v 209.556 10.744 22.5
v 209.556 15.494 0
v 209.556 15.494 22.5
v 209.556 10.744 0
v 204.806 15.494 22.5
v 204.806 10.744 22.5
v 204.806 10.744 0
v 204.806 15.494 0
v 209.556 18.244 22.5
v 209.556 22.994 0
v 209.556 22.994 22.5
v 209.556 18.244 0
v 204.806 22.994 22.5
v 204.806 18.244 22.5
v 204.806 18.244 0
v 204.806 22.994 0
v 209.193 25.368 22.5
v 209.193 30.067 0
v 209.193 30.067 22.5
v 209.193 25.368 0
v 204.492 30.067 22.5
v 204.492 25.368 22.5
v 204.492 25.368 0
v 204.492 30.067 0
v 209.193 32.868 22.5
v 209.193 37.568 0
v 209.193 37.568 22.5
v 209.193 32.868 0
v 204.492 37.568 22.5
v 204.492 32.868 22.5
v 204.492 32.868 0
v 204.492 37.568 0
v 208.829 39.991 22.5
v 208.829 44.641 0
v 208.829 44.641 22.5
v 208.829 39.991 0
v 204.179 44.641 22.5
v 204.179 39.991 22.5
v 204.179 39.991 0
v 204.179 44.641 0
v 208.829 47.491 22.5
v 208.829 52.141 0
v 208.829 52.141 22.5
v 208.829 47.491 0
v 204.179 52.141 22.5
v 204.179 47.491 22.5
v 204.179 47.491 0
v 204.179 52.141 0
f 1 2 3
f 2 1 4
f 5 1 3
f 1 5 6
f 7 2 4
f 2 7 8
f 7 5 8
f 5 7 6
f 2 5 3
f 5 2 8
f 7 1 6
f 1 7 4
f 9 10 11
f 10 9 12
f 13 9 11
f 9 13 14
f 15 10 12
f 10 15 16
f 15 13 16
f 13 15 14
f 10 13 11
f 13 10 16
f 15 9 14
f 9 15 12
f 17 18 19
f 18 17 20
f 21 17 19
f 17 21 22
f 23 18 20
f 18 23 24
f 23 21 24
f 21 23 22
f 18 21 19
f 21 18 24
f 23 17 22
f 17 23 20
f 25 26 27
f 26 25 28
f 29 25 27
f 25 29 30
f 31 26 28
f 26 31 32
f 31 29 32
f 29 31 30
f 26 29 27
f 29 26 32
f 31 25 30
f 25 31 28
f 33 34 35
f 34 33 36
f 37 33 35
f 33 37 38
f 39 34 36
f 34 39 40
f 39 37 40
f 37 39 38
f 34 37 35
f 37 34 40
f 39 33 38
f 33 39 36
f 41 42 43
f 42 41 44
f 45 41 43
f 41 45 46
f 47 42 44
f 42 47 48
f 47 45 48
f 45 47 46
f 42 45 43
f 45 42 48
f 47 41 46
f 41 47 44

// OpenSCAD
/////////////////////////////////////////////////////////////////////////////////////////
// 1. Load and position both raw mesh files
/////////////////////////////////////////////////////////////////////////////////////////
 
// load nut and transform to target position
module nut()
{
	translate( [107, 0, 258.25] )
		scale( v = [ 0.95, 1, 1 ] )
			rotate( a = [0, 0, 5] )
				rotate( a = [-92, 0, 0] )
					rotate( a = [0, 0, 45] )
						color( "Peru" ) import( file = "ow_logo_object_nut.stl" );
}

// load brain and transform to target position
module brain()
{
  brainToNutScale = 1.7;
	scale( v = [brainToNutScale, brainToNutScale, brainToNutScale] )
	  scale( v = [ 1.1, 0.96, 1] )
		  rotate( a = [ 0, 0, 0.55 ] )
		    translate( v = [ -6.8, 2.0, 70 ] )
			    mirror( [0, 0, 1] )
					  color( "White" ) import( file = "ow_logo_object_brain.stl" ); 

}

// the nut bounding box (somehow)
module nut_cube()
{
	translate( [0, 0, 0] ) 
		color( "Peru", 0.5 )
			cube( size = [275,330,167], center = false );
}

// the brain bounding box (somehow)
module brain_cube()
{
	translate( [0, -0, -167] ) 
		color( "White", 0.5 )
			cube( size = [275,330,167], center = false ); 
}

module brainnutplaced()
{
  import( file = "both_halfs.stl" );
}


/////////////////////////////////////////////////////////////////////////////////////////
// 2. Create additional parts, like a stand and connectors between them
/////////////////////////////////////////////////////////////////////////////////////////

// create pyramid on xy plane
module pyramid()
{
  // taken from OpenSCAD Wikibook
  polyhedron(
    points=[ [ 1, 1, 0 ], [ 1, -1, 0 ], [ -1, -1, 0 ], [ -1, 1, 0 ], // the four points at base
             [ 0, 0, 1 ]  ],                                 // the apex point 
    triangles=[ [ 0, 1, 4 ], [ 1, 2, 4 ], [ 2, 3, 4 ], [ 3, 0, 4 ],          // each triangle side
                [ 1, 0, 3 ], [ 2, 1, 3 ] ]                                   // two triangles for square base
  );
}

// create a connecting part: brain-nut - simple cube
module connector_nutbrain()
{
  // how deep should the casing go into the object?
  depth = 45;
  wallwidth = 2.5;
  translate( v = [ wallwidth, wallwidth, 0 ] )
    translate( v = [ 123, 148, 0 ] )
      color( "green" ) cube( size = [ 25 - 2 * wallwidth, 25  - 2 * wallwidth, depth ] );
}

// as the nut and brain meshed are not solid, we add a casing for the connection peace to 
module connector_nutbrain_casing()
{
  // how deep should the casing go into the object?
  depth = 50;
  // carve out the connector
  translate( v = [ 123, 148, 0 ] )
    color( "red" ) cube( size = [ 25, 25, depth ] );
}

// create a stand for the Nut-Brain construction
module stand()
{
  union()
  {
    translate( v = [ 0, -20, 0 ] )
      scale( v = [ 1, 1, 0.5 ] ) 
      {
        // drill the casing into the plate
        difference() 
        {
          union()
          {
            connector_nutbrain_casing();
            translate( v = [ 135.5, 160.5, 0 ] )
              color( "red" ) 
                scale( v = [ 25, 25, 200 ] ) pyramid();
          }
          translate( v =[ 105, 135, 70 ] )
            color( "red" ) cube( size = [ 50, 50, 100 ] );
          translate( v = [ 0, 0, -5 ] ) scale( v = [ 1, 1, 10 ] ) connector_nutbrain();
        }
      }

    translate( v = [ 45, 10, 6 ] )
      scale( v = [ 165, 235, 1 ] ) 
        minkowski()
        {
          translate( v = [ 0.05, 0.05, -3 ] ) cylinder( r = 0.1, h = 3, $fn = 25 );
          translate( v = [ 0, 0, -3 ] ) cube( size = [ 1, 1, 3 ] );
        }
 
    translate( v = [ 45, 10, 6 ] )
      scale( v = [ 165, 235, 3 ] ) 
        translate( v = [ 0.2, 1.05, 0 ] ) 
          mirror( [ 0, 1, 0 ] )
            rotate( a = [ 0, 0, 90 ] )
            {
              // Thanks to embossanova:
              // https://cubehero.com/physibles/iamwil/embossanova
              scale( [ 1/1050, 0.15 * 1/125, 1/256 ] )
                surface( file = "logo.dat", convexity = 5 );
            }
  }
}

/////////////////////////////////////////////////////////////////////////////////////////
// 3. Cut the meshes on the xy plane and place the connector case into the parts
/////////////////////////////////////////////////////////////////////////////////////////

// clean cut at the x-y plane at z = 0 everything  where z < 0
// -> cut the mesh area which will be inside/around the nut
module brain_cut()
{
	difference()
	{
		brain();
		nut_cube();
	}
}

// put a cube inside and carve out a smaller cube to connect brain and nut
module brain_with_connection_caseing()
{
  difference()
  {
    union()
    {
      mirror( v = [ 0, 0, 1 ] ) connector_nutbrain_casing();
      brain_cut();
    }
    mirror( v = [ 0, 0, 1 ] ) translate( v = [ 0, 0, -2 ] ) connector_nutbrain();
  }
}

// clean cut at the x-y plane at z = 0 everything  where z > 0
// -> cut the mesh area which will be inside/around the brain
module nut_cut()
{
	difference()
	{
		nut();
		brain_cube();
	}
}

// put a cube inside and carve out a smaller cube to connect brain and nut
module nut_with_connection_caseing()
{
  difference()
  {
    union()
    {
      // NOTE: carve in the casing through the whole nut. Use lower side for the stand
      scale( v = [ 1, 1, 2.70 ] )  connector_nutbrain_casing();
      nut_cut();
    }
    translate( v = [ 0, 0, -2 ] ) scale( v = [ 1, 1, 3.70 ] ) connector_nutbrain();
  }
}

// create a bunch of connectors here
module sticks( size, num )
{
  for( i = [ 0 : num - 1 ] )
  {
    translate( v = [ 700, ( i * 30 ) - 100, 0 ] ) 
      scale( v = [ size, size, 0.80 * ( 135 / 2 + 45 ) / 45 ] )    // scale in z dir to lengthen the sticks to the half length of the casing through the brain plus the insertion depth (45). Use some additional shrink factor.
        connector_nutbrain();
  }
}

/////////////////////////////////////////////////////////////////////////////////////////
// 4. Construct the logo and position everything where it belongs for printing
/////////////////////////////////////////////////////////////////////////////////////////

// now build both halfs and translate them to lay on the xy plane with positive z

// HINT: please be aware that the CSG operations with our mesh take up a lot of RAM and
// take a while to calculate. So, for experimenting, please comment out the parts you
// won't need.

// shrink it a bit to match MakerBot's size constraints
scale( 0.25 )
{

  // white parts:
  // mirror to get to positive z
  /*translate( v = [ 280, 0, 0] ) 
    mirror( [0, 0, 1] )
      brain_with_connection_caseing();

  // place stand
  translate( v = [ 550, 20, 0 ] ) 
    scale( v = [ 1.0, 1.0, 1.0 ] ) 
      stand();
*/
  // NOTE: the connectors should fit tight. Please try some scales below to find the best for your printer
  // place connector
  sticks( 0.95, 2 );
  translate( v = [ 0, 60, 0 ] ) sticks( 0.94, 2 );
  translate( v = [ 0, 120, 0 ] ) sticks( 0.93, 2 );

  // blue parts:

  // the nut already is placed where it should be
  //nut_with_connection_caseing();
}
